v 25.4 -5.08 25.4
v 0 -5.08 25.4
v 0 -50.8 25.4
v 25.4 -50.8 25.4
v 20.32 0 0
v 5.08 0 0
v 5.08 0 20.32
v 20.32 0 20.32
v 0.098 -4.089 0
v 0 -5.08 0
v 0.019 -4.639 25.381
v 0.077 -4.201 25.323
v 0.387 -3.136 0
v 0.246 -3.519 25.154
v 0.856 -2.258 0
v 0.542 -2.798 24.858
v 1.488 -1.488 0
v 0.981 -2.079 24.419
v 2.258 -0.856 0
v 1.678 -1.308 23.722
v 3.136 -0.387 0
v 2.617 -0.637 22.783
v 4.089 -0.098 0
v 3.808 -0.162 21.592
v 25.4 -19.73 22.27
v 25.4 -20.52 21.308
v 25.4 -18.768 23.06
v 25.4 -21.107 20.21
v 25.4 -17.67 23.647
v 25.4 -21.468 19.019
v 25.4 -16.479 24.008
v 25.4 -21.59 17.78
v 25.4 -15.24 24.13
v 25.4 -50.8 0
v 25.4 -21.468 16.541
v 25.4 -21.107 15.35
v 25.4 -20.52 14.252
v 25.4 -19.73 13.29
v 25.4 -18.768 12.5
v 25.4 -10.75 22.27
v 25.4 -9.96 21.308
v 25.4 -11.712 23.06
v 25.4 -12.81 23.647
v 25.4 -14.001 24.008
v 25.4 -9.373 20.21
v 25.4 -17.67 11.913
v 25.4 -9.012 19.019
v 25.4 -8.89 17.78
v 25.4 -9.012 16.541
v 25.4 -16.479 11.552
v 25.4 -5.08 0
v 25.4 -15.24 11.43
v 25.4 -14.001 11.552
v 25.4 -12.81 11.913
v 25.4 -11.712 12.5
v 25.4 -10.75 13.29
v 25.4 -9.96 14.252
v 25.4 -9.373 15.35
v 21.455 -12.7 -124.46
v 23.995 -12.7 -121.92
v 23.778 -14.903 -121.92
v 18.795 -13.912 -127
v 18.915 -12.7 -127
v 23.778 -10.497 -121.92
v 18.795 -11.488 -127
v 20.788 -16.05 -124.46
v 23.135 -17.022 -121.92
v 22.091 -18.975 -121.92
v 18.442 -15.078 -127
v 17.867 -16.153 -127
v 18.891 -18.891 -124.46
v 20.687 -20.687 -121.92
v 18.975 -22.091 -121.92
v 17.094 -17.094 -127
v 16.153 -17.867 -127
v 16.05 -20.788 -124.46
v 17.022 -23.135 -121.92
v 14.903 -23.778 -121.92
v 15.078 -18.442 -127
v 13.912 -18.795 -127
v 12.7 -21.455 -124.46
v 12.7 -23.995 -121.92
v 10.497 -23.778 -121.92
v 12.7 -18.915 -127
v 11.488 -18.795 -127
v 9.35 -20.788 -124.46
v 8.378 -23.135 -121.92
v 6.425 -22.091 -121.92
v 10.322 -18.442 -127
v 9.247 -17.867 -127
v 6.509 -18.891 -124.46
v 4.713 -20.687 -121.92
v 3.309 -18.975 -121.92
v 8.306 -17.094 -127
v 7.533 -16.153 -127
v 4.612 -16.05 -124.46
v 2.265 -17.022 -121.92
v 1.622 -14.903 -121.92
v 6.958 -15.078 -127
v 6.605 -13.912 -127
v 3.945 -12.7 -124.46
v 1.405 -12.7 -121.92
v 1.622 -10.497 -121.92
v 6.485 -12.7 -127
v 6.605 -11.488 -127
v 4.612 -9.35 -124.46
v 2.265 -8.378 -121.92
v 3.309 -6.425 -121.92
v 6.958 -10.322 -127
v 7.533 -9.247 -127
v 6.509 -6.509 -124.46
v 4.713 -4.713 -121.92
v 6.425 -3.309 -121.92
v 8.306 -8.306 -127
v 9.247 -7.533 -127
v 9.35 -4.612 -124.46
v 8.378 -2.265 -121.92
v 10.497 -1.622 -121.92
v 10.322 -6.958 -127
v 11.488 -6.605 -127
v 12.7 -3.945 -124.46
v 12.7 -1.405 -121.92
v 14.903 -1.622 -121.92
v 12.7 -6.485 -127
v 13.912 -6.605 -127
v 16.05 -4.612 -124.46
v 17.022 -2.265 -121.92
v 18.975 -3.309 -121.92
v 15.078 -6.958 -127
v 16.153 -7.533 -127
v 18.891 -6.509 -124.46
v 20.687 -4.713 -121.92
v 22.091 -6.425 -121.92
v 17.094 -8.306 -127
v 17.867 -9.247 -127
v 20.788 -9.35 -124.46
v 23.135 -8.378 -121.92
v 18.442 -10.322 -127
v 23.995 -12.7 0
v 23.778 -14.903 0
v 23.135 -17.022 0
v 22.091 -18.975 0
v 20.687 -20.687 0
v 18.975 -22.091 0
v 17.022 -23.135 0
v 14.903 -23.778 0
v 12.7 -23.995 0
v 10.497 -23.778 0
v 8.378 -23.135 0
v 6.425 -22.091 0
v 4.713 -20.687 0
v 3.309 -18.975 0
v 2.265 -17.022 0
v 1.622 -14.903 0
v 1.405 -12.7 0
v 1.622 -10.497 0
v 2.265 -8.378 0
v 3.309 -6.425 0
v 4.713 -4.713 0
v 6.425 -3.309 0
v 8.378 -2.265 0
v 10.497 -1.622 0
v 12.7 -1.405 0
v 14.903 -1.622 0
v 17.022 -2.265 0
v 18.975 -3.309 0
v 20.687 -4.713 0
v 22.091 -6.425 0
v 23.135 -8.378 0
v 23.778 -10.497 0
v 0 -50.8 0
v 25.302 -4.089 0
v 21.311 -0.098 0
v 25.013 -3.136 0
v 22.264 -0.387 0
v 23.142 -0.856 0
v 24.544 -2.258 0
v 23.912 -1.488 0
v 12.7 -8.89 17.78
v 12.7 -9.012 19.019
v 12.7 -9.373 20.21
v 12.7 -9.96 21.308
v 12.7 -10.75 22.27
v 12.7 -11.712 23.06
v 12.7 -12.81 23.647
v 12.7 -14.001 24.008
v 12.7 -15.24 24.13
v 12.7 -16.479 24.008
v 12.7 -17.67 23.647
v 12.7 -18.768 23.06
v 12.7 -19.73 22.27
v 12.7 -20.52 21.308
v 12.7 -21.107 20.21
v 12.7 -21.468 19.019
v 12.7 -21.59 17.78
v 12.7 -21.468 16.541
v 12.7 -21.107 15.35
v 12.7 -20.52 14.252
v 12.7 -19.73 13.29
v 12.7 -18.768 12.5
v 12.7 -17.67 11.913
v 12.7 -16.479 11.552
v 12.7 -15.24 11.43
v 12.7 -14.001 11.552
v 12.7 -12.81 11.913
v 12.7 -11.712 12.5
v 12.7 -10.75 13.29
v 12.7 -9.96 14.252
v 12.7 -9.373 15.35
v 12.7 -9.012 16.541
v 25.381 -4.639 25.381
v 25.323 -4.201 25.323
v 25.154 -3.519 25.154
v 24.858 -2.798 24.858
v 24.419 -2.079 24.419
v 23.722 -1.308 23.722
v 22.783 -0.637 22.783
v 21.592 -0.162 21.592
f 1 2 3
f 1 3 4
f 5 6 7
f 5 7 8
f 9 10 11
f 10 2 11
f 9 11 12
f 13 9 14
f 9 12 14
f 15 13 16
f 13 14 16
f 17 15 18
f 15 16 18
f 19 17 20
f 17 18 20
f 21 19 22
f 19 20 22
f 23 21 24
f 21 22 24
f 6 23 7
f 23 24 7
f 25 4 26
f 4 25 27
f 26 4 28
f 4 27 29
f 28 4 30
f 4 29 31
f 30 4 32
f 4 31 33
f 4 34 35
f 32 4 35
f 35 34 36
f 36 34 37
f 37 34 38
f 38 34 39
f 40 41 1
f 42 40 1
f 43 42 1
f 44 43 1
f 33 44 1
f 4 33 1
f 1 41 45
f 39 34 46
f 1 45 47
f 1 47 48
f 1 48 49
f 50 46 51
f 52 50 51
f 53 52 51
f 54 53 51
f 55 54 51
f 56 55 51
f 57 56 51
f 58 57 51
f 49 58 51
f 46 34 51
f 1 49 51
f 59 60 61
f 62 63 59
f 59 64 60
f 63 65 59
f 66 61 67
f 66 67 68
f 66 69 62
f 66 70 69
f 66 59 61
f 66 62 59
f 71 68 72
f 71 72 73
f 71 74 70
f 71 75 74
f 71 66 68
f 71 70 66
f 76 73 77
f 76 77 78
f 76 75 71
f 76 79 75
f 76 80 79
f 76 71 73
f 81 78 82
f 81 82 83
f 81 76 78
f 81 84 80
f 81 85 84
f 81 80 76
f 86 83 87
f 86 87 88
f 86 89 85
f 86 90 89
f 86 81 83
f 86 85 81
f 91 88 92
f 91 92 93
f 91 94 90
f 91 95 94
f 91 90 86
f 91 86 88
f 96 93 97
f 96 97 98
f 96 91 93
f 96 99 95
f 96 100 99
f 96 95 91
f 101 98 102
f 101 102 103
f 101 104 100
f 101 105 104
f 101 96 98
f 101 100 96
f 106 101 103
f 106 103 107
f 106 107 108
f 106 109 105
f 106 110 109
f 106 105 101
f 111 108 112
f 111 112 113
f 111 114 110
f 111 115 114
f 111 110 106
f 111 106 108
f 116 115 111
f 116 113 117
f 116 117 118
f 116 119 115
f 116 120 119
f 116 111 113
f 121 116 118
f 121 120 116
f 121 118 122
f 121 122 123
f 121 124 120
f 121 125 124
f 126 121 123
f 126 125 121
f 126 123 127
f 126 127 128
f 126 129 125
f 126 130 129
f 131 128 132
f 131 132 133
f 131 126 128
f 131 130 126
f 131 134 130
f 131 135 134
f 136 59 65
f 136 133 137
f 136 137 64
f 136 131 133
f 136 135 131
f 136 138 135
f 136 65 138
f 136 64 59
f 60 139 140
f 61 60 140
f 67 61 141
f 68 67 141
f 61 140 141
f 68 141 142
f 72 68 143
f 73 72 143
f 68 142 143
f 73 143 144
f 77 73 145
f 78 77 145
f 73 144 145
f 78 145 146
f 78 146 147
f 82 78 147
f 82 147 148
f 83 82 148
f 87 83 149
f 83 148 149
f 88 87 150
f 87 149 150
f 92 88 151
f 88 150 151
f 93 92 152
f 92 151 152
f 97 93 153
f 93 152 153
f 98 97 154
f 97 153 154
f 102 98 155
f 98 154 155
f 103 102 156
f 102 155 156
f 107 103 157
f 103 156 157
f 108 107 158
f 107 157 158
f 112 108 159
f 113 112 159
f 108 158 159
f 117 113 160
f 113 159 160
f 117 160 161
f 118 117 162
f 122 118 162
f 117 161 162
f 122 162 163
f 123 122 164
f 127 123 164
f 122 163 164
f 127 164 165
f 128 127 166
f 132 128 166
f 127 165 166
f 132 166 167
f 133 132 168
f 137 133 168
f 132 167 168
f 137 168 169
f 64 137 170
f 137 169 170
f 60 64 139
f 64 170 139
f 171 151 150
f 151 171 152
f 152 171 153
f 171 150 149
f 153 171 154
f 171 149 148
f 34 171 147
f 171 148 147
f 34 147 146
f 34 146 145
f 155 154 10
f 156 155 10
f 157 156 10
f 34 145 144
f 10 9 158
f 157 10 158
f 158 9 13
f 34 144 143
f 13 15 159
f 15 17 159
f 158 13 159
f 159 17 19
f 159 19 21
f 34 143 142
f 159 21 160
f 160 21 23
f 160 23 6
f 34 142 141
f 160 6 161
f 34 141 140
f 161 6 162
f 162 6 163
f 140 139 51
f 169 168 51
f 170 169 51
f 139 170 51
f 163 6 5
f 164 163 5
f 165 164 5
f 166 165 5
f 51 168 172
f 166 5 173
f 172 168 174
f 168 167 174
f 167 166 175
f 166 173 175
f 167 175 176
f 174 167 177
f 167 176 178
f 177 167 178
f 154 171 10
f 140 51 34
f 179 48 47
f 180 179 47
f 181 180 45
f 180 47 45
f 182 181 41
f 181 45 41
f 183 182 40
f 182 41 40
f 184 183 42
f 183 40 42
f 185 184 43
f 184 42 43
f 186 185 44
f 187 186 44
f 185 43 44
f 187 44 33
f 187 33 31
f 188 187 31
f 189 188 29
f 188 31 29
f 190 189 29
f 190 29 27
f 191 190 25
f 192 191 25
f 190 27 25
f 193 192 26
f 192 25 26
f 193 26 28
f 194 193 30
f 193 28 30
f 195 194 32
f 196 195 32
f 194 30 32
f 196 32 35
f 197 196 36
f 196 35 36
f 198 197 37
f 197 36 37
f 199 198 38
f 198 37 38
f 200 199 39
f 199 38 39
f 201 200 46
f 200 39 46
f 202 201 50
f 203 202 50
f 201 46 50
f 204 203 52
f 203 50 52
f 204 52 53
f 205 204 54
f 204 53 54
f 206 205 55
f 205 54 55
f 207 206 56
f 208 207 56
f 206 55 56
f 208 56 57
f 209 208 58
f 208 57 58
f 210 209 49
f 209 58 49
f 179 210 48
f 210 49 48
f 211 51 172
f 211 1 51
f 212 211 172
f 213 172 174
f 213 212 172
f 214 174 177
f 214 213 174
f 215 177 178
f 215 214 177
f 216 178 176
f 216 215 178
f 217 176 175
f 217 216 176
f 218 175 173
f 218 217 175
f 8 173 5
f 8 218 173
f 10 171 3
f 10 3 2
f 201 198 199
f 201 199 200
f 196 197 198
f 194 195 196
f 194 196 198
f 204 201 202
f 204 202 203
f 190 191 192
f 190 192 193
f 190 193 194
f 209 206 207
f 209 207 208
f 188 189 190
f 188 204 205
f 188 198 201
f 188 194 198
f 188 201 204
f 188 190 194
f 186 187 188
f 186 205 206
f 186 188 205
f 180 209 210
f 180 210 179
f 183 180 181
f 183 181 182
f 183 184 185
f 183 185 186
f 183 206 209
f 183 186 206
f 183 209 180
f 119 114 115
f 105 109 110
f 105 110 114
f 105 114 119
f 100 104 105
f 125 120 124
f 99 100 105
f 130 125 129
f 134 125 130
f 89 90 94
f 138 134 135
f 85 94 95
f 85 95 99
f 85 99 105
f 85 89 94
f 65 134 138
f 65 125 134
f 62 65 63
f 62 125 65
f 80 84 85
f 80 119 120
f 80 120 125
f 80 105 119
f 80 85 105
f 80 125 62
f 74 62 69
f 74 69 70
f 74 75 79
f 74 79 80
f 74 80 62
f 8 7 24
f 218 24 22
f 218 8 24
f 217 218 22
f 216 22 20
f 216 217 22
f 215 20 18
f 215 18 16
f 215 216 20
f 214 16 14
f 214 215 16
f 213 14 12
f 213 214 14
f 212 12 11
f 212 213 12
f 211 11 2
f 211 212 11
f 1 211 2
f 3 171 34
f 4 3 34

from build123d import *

# Parameters (mm, degrees)
F0_W     = 25.4
F0_H     = 50.8
F1_DEPTH = 25.4
F2_R     = 5.08
F3_R     = 11.294714
F4_DEPTH = 127
F5_SIZE  = 5.08
F6_R     = 6.35
F7_DEPTH = 12.7


with BuildPart() as f1:
    # F0 (on Top) → F1 (new body)
    with BuildSketch(Plane.XY):
        with Locations((12.7, -25.4)):
            Rectangle(F0_W, F0_H)
    extrude(amount=F1_DEPTH)

    # F2
    f2_edges = [f1.edges().sort_by_distance(p)[0] for p in [
        (12.7, 0, 25.4),
        (25.4, 0, 12.7),
        (0, 0, 12.7),
    ]]
    fillet(f2_edges, radius=F2_R)

    # F3 (on face) → F4 (join)
    with BuildSketch(Plane(origin=(0, 0, 0), x_dir=(1, 0, 0), z_dir=(0, 0, -1))):
        with Locations((12.7, 12.7)):
            Circle(F3_R)
    extrude(amount=F4_DEPTH)

    # F5
    f5_edges = [f1.edges().sort_by_distance(p)[0] for p in [
        (1.405286, -12.7, -127),
    ]]
    chamfer(f5_edges, length=F5_SIZE)

    # F6 (on face) → F7 (cut)
    with BuildSketch(Plane.YZ.offset(25.4)):
        with Locations((-15.24, 17.78)):
            Circle(F6_R)
    extrude(amount=-F7_DEPTH, mode=Mode.SUBTRACT)


solid = f1.part
